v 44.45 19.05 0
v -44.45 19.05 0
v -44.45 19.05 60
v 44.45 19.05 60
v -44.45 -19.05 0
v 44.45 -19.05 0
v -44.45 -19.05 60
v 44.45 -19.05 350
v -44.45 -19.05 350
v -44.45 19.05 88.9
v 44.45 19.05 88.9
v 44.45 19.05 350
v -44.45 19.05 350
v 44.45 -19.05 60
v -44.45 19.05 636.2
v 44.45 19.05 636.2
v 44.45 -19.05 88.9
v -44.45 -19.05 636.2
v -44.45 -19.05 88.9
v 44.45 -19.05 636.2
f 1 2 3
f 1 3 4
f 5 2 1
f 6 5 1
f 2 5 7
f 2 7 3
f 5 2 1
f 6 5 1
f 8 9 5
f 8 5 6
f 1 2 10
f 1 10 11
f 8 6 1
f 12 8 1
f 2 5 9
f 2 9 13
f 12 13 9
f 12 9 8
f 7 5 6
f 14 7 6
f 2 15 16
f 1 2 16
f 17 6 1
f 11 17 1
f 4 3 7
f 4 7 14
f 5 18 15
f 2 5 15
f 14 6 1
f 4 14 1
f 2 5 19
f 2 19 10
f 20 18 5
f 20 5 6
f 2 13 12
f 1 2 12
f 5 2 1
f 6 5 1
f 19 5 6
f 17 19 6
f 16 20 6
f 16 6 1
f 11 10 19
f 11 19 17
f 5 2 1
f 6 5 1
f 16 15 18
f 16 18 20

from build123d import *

# Parameters (mm, degrees)
F0_W     = 88.9
F0_H     = 38.1
F1_DEPTH = 350
F2_DEPTH = 636.2
F3_DEPTH = 88.9
F4_DEPTH = 60


with BuildPart() as f1:
    # F0 (on Top) → F1 (new body)
    with BuildSketch(Plane.XY):
        Rectangle(F0_W, F0_H)
    extrude(amount=F1_DEPTH)


with BuildPart() as f2:
    # F0 (on Top) → F2 (new body)
    with BuildSketch(Plane.XY):
        Rectangle(F0_W, F0_H)
    extrude(amount=F2_DEPTH)


with BuildPart() as f3:
    # F0 (on Top) → F3 (new body)
    with BuildSketch(Plane.XY):
        Rectangle(F0_W, F0_H)
    extrude(amount=F3_DEPTH)


with BuildPart() as f4:
    # F0 (on Top) → F4 (new body)
    with BuildSketch(Plane.XY):
        Rectangle(F0_W, F0_H)
    extrude(amount=F4_DEPTH)


solid = Compound([f1.part, f2.part, f3.part, f4.part])
